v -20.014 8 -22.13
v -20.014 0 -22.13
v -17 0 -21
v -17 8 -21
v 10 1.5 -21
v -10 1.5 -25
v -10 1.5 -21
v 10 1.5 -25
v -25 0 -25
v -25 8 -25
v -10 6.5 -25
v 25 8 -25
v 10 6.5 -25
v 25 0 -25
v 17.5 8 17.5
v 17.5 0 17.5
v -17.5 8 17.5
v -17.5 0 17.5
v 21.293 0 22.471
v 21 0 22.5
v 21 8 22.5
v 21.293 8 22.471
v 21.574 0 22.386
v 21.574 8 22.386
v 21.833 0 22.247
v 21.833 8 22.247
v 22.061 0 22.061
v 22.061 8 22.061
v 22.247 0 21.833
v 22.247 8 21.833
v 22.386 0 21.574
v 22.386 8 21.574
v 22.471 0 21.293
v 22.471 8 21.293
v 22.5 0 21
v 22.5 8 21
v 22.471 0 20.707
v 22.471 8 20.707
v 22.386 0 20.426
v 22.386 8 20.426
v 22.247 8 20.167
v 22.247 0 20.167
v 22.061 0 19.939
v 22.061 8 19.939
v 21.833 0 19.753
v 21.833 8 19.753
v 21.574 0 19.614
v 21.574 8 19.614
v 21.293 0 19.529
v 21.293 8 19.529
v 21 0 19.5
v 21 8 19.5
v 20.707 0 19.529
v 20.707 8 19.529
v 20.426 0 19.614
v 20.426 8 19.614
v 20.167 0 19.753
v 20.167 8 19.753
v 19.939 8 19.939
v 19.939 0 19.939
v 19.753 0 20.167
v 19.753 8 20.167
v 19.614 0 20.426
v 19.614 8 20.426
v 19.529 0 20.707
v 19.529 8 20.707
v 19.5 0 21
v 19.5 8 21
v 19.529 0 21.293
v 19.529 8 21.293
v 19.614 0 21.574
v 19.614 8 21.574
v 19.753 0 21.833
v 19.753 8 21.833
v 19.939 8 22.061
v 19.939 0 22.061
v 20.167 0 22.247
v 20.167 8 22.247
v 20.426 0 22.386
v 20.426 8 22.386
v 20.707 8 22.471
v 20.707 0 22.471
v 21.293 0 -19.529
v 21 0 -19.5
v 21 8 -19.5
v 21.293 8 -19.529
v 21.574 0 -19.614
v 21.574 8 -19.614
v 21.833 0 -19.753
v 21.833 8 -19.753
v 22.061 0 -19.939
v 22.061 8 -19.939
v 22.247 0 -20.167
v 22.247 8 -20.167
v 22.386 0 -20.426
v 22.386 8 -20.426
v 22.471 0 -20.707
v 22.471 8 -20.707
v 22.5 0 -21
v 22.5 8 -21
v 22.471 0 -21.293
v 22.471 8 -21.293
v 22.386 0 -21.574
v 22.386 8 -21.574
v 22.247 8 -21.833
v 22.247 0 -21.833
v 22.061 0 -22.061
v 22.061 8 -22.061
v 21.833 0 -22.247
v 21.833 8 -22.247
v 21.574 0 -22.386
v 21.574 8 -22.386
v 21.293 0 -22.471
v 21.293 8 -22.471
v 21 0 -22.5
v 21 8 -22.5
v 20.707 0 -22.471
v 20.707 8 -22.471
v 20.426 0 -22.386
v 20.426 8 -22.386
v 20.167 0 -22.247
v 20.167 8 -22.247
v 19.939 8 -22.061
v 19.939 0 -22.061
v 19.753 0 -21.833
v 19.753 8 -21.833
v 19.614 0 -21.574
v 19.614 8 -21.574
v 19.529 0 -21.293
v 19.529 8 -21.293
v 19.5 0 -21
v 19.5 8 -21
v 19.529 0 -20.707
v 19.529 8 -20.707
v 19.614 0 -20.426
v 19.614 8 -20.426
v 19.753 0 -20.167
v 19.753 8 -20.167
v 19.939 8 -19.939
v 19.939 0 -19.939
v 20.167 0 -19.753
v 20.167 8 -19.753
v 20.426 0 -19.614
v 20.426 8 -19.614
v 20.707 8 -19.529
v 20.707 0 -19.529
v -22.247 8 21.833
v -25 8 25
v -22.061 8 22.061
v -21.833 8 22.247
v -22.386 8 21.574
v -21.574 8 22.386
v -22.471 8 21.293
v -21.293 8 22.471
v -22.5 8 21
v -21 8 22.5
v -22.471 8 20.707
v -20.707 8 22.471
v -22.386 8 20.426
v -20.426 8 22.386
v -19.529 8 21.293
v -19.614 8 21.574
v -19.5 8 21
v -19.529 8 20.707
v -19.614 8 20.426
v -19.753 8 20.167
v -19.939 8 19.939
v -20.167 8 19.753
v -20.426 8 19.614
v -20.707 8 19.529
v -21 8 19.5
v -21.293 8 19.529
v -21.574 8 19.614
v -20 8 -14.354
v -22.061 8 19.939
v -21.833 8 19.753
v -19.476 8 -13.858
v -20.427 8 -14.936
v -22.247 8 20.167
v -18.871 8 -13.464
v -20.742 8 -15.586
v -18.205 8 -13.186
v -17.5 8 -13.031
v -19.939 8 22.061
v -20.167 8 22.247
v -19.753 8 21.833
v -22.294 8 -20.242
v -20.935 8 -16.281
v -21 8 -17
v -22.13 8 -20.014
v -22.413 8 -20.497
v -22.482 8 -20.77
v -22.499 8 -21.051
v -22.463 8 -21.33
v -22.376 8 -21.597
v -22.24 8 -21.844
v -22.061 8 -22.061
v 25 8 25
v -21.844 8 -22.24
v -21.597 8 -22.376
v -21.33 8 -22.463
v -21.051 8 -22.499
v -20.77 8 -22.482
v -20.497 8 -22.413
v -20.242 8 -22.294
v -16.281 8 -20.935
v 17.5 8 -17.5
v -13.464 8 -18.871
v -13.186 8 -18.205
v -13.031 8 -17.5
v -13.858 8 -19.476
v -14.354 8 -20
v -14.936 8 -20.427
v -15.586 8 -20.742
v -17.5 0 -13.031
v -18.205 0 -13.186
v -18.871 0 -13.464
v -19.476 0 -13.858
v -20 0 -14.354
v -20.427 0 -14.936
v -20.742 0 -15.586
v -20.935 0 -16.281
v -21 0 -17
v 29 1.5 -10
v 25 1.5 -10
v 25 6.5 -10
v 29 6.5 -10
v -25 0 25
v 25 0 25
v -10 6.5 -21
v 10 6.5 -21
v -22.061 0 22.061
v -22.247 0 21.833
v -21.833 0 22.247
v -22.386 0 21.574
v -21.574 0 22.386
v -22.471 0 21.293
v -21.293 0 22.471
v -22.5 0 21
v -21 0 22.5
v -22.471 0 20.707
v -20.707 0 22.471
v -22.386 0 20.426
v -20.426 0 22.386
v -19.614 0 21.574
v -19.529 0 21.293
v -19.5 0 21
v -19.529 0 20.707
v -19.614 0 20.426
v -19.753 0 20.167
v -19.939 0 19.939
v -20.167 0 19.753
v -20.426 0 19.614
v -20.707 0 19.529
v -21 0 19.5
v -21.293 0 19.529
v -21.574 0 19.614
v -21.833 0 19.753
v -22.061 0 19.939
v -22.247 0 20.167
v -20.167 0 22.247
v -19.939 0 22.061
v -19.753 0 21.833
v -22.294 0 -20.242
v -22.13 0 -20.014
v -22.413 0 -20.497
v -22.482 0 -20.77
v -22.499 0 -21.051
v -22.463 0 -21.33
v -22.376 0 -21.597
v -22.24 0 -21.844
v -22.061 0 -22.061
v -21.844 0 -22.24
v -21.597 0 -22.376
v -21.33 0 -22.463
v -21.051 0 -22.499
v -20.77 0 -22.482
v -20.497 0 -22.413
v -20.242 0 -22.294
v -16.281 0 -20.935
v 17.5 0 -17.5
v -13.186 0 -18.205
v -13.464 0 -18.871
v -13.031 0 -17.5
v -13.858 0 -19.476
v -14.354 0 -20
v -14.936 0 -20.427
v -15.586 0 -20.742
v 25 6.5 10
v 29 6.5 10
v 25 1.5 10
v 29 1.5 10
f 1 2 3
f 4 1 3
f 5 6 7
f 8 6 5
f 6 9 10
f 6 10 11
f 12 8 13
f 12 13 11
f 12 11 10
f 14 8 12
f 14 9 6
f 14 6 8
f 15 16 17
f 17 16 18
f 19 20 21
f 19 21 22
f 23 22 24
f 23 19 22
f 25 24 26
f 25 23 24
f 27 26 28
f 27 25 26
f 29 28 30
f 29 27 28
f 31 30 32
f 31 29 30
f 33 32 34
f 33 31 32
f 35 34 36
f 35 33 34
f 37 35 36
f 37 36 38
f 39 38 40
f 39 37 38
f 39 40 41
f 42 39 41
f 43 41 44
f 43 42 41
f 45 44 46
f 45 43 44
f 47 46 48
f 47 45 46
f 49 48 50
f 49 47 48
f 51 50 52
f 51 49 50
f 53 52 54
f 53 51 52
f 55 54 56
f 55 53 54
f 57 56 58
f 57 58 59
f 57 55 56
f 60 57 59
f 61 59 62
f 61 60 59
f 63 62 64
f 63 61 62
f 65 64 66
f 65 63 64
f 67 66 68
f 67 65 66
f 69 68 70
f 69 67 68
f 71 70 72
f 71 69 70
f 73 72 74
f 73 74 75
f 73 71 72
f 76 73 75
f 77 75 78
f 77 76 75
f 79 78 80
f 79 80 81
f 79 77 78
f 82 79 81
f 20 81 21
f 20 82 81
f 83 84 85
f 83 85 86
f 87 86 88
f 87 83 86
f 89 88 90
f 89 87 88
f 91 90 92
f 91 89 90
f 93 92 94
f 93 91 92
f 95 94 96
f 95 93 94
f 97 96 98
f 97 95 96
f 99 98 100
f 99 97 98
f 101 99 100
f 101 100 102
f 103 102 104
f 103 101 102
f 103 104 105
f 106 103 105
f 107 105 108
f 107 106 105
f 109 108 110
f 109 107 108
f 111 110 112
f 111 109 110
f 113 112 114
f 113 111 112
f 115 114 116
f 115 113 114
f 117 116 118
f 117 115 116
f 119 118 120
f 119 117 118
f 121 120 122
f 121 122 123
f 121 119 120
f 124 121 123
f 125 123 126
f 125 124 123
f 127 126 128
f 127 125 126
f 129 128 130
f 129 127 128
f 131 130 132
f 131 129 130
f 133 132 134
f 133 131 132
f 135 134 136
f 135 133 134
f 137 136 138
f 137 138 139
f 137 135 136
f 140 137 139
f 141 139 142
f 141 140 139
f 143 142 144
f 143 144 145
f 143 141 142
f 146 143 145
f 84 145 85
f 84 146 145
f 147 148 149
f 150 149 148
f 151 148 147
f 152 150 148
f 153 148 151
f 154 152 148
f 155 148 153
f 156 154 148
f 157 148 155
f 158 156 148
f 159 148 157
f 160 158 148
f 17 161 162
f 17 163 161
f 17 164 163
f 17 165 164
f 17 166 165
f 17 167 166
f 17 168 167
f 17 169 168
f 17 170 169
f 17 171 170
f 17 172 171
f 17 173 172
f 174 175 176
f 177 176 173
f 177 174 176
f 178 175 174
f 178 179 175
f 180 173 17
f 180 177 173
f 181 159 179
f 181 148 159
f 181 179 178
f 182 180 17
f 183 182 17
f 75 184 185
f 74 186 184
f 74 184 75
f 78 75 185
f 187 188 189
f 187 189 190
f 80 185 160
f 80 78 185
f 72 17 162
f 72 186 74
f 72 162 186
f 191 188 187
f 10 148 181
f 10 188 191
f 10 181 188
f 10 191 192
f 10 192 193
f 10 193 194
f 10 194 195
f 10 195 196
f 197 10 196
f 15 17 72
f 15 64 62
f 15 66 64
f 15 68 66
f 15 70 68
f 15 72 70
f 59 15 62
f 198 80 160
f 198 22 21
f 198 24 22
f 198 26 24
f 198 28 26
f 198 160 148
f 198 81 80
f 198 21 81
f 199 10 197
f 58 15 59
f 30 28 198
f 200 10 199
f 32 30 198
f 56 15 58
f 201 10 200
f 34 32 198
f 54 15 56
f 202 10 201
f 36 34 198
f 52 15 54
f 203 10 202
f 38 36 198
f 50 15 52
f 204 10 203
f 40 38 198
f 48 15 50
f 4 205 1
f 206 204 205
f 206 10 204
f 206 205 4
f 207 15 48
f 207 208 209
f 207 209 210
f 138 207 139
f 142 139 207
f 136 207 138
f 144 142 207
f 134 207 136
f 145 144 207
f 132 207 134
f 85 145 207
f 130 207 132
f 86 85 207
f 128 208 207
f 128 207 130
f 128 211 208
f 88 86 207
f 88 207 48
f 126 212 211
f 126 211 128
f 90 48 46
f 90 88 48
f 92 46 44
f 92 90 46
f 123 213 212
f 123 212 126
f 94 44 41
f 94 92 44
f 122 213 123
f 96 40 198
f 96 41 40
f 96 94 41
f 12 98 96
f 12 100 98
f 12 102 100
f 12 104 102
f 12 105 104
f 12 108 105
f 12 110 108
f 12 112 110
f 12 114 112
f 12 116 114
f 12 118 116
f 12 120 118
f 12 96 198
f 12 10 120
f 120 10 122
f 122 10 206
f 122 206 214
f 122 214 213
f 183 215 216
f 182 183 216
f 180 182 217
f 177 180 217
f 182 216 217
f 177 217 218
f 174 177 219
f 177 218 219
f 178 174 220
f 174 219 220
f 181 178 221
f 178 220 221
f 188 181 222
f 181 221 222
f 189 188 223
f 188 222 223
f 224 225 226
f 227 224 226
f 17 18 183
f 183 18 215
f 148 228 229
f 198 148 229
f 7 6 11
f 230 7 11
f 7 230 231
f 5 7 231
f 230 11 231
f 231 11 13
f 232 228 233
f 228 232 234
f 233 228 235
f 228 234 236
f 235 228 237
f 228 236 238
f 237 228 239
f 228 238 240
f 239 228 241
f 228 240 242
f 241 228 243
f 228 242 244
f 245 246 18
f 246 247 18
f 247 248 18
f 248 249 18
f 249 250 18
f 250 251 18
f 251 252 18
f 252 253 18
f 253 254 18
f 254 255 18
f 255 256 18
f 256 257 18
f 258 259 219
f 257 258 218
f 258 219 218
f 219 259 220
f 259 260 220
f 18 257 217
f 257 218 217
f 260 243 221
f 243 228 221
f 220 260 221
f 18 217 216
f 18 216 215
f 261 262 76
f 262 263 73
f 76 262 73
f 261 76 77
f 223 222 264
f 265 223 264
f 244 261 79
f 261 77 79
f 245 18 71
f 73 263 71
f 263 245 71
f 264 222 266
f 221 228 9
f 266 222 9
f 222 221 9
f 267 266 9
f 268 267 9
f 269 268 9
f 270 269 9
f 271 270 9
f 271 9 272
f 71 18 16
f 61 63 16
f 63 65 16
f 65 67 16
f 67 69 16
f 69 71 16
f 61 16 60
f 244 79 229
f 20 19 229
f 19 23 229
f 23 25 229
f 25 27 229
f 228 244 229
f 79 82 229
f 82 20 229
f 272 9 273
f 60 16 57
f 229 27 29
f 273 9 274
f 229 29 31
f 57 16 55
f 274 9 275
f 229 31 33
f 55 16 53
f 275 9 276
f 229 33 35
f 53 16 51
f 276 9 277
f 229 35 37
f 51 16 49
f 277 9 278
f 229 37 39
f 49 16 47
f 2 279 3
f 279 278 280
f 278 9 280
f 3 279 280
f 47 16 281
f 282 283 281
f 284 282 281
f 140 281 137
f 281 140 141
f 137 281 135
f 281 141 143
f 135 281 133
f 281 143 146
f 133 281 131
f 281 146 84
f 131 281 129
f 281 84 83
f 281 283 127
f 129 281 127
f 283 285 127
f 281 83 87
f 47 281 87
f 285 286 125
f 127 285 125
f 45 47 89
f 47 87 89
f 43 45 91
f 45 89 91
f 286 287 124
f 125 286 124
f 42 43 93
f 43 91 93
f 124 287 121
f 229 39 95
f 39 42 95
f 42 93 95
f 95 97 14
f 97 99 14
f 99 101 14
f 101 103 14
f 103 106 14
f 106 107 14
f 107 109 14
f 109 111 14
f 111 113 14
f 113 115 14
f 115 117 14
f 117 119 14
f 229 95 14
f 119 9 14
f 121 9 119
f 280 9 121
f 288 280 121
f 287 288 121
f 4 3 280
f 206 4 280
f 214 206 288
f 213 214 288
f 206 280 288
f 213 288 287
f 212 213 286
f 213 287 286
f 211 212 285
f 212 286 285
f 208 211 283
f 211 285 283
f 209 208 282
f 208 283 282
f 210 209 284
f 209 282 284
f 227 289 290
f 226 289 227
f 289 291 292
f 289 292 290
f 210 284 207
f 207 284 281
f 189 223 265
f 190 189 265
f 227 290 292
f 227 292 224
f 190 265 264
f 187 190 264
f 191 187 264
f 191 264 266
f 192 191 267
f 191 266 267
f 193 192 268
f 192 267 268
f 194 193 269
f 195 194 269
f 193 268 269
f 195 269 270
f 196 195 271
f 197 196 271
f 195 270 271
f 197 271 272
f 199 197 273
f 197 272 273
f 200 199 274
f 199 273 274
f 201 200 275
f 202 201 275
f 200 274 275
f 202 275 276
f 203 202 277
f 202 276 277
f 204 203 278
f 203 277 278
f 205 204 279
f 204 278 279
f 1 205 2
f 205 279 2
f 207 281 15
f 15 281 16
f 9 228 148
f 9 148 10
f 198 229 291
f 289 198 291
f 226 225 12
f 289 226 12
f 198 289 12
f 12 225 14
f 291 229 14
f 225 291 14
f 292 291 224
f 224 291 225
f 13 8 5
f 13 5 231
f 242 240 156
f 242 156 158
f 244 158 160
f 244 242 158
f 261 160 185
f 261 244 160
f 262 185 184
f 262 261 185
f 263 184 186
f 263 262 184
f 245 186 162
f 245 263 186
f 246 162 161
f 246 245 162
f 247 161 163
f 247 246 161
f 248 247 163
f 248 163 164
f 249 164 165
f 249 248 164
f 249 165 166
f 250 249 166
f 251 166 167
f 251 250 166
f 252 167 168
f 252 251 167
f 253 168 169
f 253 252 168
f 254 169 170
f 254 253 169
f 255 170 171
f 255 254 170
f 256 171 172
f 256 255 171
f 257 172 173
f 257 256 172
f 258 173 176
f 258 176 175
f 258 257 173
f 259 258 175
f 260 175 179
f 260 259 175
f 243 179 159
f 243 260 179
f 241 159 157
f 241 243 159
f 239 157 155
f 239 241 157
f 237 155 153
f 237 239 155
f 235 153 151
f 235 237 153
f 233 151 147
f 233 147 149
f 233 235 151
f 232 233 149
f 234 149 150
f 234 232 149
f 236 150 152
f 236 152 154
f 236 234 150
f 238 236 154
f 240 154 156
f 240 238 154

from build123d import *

# Parameters (mm, degrees)
SKETCH1_W        = 50
SKETCH1_H        = 50
SKETCH1_R        = 1.5
SUPPORT_DEPTH    = 8
NORTH_START      = -25
SKETCH2_W        = 20
SKETCH2_H        = 5
NORTH_CUT_DEPTH  = 4
EAST_START       = 25
SKETCH3_W        = 20
SKETCH3_H        = 5
EAST_DOWEL_DEPTH = 4


with BuildPart() as part:
    # Sketch1 → Support (new body)
    with BuildSketch(Plane(origin=(0, 0, 0), x_dir=(1, 0, 0), z_dir=(0, 1, 0))):
        Rectangle(SKETCH1_W, SKETCH1_H)
        with Locations(Location((-21, -21, 0), (0, 0, 270))):
            Circle(SKETCH1_R, mode=Mode.SUBTRACT)
        with Locations(Location((21, -21, 0), (0, 0, 270))):
            Circle(SKETCH1_R, mode=Mode.SUBTRACT)
        with BuildLine():
            Line((-13.031373033, 17.5), (17.5, 17.5))
            Line((17.5, 17.5), (17.5, -17.5))
            Line((17.5, -17.5), (-17.5, -17.5))
            Line((-17.5, -17.5), (-17.5, 13.031373033))
            ThreePointArc((-17.5, 13.031373033), (-20, 14.354248689), (-21, 17))
            Line((-21, 17), (-22.130136986, 20.01369863))
            ThreePointArc((-22.130136986, 20.01369863), (-22.060660172, 22.060660172), (-20.01369863, 22.130136986))
            Line((-20.01369863, 22.130136986), (-17, 21))
            ThreePointArc((-17, 21), (-14.354248689, 20), (-13.031373033, 17.5))
        make_face(mode=Mode.SUBTRACT)
        with Locations(Location((21, 21, 0), (0, 0, 270))):
            Circle(SKETCH1_R, mode=Mode.SUBTRACT)
    extrude(amount=SUPPORT_DEPTH)

    # Sketch2 → North Cut (cut)
    with BuildSketch(Plane.XY.offset(NORTH_START)):
        with Locations((0, 4)):
            Rectangle(SKETCH2_W, SKETCH2_H)
    extrude(amount=NORTH_CUT_DEPTH, mode=Mode.SUBTRACT)

    # Sketch3 → East Dowel (add)
    with BuildSketch(Plane(origin=(0, 0, 0), x_dir=(0, 0, -1), z_dir=(1, 0, 0)).offset(EAST_START)):
        with Locations((0, 4)):
            Rectangle(SKETCH3_W, SKETCH3_H)
    extrude(amount=EAST_DOWEL_DEPTH)


solid = part.part
